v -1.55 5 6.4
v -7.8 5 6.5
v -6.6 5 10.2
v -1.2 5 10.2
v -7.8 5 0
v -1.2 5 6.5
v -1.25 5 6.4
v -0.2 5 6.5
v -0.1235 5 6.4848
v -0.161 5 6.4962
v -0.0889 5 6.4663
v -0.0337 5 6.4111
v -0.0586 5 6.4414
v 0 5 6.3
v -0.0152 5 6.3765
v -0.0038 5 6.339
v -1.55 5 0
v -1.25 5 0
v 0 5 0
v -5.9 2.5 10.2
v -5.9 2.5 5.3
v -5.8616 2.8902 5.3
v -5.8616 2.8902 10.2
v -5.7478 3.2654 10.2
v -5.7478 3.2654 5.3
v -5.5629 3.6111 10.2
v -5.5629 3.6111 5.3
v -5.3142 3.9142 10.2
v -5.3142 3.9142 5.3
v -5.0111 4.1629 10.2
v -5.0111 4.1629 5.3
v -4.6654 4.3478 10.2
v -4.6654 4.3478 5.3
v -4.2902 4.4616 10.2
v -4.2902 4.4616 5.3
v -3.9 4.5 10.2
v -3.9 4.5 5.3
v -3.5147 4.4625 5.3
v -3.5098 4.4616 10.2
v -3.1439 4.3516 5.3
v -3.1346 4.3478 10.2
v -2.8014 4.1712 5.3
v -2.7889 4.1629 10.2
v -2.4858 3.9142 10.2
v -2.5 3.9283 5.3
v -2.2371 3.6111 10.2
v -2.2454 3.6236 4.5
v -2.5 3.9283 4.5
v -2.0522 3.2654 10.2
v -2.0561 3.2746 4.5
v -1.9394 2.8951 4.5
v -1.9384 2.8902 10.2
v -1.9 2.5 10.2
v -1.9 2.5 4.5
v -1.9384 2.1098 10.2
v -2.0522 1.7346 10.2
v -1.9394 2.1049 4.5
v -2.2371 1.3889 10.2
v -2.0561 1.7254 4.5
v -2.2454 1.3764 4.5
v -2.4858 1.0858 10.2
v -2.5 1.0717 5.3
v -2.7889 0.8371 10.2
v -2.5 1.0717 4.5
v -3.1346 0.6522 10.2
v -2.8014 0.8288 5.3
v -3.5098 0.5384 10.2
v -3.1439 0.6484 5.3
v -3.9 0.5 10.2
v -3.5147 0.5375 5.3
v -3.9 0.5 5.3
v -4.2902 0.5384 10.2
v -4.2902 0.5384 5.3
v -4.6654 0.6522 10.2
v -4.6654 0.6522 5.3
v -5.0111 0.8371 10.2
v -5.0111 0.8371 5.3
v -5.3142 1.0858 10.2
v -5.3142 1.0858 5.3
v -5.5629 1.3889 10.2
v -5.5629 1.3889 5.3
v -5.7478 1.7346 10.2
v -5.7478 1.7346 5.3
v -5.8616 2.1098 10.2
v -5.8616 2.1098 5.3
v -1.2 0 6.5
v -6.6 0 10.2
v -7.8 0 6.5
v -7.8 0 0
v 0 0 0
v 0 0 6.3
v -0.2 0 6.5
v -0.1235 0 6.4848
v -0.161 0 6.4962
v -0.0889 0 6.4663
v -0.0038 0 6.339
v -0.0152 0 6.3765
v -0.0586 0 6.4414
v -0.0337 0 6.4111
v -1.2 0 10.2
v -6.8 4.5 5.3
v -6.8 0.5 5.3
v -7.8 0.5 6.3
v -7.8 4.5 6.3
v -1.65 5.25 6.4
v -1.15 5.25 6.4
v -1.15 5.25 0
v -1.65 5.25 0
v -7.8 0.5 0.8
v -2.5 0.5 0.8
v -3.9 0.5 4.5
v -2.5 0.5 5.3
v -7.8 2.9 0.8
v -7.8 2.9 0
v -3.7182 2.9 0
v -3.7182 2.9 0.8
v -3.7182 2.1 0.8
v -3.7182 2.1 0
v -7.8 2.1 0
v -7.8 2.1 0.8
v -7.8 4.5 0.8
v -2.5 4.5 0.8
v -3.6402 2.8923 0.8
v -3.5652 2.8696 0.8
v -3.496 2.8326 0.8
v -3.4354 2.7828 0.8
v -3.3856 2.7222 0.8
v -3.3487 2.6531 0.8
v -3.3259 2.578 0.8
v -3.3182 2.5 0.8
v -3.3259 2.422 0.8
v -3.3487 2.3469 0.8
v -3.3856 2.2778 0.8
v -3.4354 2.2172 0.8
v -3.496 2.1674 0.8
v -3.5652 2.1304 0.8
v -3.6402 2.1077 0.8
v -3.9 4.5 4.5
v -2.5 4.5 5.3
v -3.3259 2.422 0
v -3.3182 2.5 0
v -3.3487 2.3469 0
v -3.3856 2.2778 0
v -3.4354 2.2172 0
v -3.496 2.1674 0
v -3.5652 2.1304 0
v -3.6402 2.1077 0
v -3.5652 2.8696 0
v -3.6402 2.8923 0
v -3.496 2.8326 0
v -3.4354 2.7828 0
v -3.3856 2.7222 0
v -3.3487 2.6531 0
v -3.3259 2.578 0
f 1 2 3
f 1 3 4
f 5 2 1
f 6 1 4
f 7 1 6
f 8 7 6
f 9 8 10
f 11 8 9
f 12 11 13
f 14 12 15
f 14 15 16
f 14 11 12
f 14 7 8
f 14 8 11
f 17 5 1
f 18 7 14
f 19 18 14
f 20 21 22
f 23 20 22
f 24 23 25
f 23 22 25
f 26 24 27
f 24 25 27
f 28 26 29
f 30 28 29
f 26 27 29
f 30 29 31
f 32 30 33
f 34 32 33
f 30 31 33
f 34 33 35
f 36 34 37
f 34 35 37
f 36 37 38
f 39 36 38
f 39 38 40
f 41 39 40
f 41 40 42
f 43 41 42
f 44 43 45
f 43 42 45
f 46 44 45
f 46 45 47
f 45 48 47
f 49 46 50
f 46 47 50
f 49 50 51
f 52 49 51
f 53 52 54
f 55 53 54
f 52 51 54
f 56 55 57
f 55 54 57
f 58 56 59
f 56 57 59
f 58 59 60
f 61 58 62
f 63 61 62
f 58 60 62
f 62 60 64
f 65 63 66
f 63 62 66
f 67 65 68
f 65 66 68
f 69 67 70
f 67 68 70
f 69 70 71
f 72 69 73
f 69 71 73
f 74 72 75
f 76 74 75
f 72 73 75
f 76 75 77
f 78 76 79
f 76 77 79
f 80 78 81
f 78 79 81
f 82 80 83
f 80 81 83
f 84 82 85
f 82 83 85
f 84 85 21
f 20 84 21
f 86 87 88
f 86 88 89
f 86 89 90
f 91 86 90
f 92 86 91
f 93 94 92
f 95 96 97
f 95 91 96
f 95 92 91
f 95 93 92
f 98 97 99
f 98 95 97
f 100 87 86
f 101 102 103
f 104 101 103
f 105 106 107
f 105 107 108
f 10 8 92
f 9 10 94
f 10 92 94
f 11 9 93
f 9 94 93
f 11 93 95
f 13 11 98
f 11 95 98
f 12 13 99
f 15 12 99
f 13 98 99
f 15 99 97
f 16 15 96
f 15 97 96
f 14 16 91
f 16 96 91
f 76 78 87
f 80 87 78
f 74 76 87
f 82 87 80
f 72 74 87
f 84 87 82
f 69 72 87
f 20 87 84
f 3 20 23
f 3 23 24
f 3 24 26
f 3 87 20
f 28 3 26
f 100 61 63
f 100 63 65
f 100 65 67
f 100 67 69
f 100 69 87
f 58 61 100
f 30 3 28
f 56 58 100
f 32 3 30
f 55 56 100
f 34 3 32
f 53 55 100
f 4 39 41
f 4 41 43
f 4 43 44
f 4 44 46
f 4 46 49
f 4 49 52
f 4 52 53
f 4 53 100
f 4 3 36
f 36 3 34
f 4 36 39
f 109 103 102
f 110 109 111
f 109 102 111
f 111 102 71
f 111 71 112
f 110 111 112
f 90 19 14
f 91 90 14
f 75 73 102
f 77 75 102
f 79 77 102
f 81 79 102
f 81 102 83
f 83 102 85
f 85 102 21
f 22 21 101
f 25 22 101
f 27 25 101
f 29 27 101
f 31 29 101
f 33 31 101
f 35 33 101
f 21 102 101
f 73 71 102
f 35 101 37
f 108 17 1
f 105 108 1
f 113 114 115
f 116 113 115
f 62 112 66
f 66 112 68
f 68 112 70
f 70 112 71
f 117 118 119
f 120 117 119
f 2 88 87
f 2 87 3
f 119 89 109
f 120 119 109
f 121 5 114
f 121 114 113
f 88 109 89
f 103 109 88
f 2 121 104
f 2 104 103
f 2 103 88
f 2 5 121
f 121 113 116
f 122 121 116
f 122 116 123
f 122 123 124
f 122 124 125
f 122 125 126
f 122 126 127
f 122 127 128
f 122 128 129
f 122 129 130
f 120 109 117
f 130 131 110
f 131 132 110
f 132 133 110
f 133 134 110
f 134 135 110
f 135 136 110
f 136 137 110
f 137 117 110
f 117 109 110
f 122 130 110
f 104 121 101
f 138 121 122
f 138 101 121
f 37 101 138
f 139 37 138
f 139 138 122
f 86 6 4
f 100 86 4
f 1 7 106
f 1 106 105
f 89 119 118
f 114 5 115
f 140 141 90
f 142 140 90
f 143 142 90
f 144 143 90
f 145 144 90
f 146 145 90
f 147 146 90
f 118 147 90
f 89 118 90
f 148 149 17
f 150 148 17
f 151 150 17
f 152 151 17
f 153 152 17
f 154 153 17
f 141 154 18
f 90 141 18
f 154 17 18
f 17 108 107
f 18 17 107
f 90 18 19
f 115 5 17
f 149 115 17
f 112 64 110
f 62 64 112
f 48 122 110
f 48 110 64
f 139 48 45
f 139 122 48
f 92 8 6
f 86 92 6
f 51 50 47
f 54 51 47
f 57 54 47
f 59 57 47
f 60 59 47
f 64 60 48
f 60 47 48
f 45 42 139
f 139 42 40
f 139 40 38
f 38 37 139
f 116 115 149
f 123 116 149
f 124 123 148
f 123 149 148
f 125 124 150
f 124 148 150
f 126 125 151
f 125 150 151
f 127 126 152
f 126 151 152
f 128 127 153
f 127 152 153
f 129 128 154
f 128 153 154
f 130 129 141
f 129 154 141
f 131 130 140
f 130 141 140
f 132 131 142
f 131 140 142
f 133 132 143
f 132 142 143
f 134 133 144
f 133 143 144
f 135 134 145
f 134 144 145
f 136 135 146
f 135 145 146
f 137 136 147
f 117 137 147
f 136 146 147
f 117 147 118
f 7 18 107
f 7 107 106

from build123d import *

# Parameters (mm, degrees)
SKETCH_1_W                = 7.8
SKETCH_1_H                = 10.2
EXTRUDE_1_DEPTH           = 4.5
CUT_EXTRUDE_1_DEPTH       = 4
SKETCH_3_W                = 4.5
SKETCH_3_H                = 4
CUT_EXTRUDE_2_DEPTH       = 4.3
SKETCH_4_W                = 7.8
SKETCH_4_H                = 10.2
EXTRUDE_2_DEPTH           = 0.5
SKETCH_5_W                = 1.2
SKETCH_5_H                = 3.7
CUT_EXTRUDE_3_DEPTH       = 14.779695207
CUT_EXTRUDE_4_REACH       = 15.78
SKETCH_7_W                = 0.3
SKETCH_7_H                = 6.4
EXTRUDE_3_DEPTH           = 0.25
DRAFT_1_ANGLE             = -21.801409486
HOLE_WIZARD_4_0_4_1_D     = 4
HOLE_WIZARD_4_0_4_1_DEPTH = 5.7
CHAMFER_1_SIZE            = 1.2
CHAMFER_1_SIZE2           = 3.7
FILLET_1_R                = 0.2


with BuildPart() as part:
    # Эскиз1 → Бобышка-Вытянуть1 (new body)
    with BuildSketch(Plane(origin=(0, 5, 0), x_dir=(1, 0, 0), z_dir=(0, 1, 0))):
        with Locations((-3.9, -5.1)):
            Rectangle(SKETCH_1_W, SKETCH_1_H)
    extrude(amount=-EXTRUDE_1_DEPTH)

    # Эскиз2 → Вырез-Вытянуть1 (cut)
    with BuildSketch(Plane.XZ.offset(-0.5)):
        Polygon((-6.8, 0.8), (-6.8, 5.3), (-7.8, 6.3), (-7.8, 0.8), align=None)
    extrude(amount=-CUT_EXTRUDE_1_DEPTH, mode=Mode.SUBTRACT)

    # Эскиз3 → Вырез-Вытянуть2 (cut)
    with BuildSketch(Plane.ZY.offset(6.8)):
        with Locations((3.05, 2.5)):
            Rectangle(SKETCH_3_W, SKETCH_3_H)
    extrude(amount=-CUT_EXTRUDE_2_DEPTH, mode=Mode.SUBTRACT)

    # Эскиз4 → Бобышка-Вытянуть2 (add)
    with BuildSketch(Plane.XZ.offset(-0.5)):
        with Locations((-3.9, 5.1)):
            Rectangle(SKETCH_4_W, SKETCH_4_H)
    extrude(amount=EXTRUDE_2_DEPTH)

    # Эскиз5 → Вырез-Вытянуть3 (cut, through all)
    with BuildSketch(Plane(origin=(0, 5, 0), x_dir=(-1, 0, 0), z_dir=(0, 1, 0))):
        with Locations((0.6, 8.35)):
            Rectangle(SKETCH_5_W, SKETCH_5_H)
    extrude(amount=-CUT_EXTRUDE_3_DEPTH, mode=Mode.SUBTRACT)

    # Эскиз6 → Вырез-Вытянуть4 (cut, up to next)
    with BuildSketch(Plane(origin=(0, 0, 0), x_dir=(-1, 0, 0), z_dir=(0, 0, -1)), mode=Mode.PRIVATE) as cut_extrude_4_sk1:
        with BuildLine():
            Line((7.8, 2.1), (7.8, 2.9))
            Line((7.8, 2.9), (3.71823341, 2.9))
            ThreePointArc((3.71823341, 2.9), (3.31823341, 2.5), (3.71823341, 2.1))
            Line((3.71823341, 2.1), (7.8, 2.1))
        make_face()
    cut_extrude_4_tool1 = extrude(cut_extrude_4_sk1.sketch, amount=-CUT_EXTRUDE_4_REACH, mode=Mode.PRIVATE) & part.part
    add(cut_extrude_4_tool1.solids().sort_by_distance((-5.60113, 2.5, 0))[0], mode=Mode.SUBTRACT)

    # Эскиз7 → Бобышка-Вытянуть3 (add)
    with BuildSketch(Plane(origin=(0, 5, 0), x_dir=(-1, 0, 0), z_dir=(0, 1, 0))):
        with Locations((1.4, 3.2)):
            Rectangle(SKETCH_7_W, SKETCH_7_H)
    extrude(amount=EXTRUDE_3_DEPTH)

    # Уклон1
    draft_1_faces = [part.faces().sort_by_distance(p)[0] for p in [
        (-1.55, 5.125, 3.2),
        (-1.25, 5.125, 3.2),
    ]]
    draft(draft_1_faces, Plane.ZX.offset(5), DRAFT_1_ANGLE)

    # Диаметр отверстия Ø4.0 (4)1
    with Locations(Plane.XY.offset(10.2)):
        with Locations((-3.9, 2.5)):
            Hole(HOLE_WIZARD_4_0_4_1_D / 2, depth=HOLE_WIZARD_4_0_4_1_DEPTH)

    # Фаска1
    chamfer_1_edges = [part.edges().sort_by_distance(p)[0] for p in [
        (-7.8, 2.5, 10.2),
    ]]
    chamfer_1_side = [part.faces().sort_by_distance(p)[0] for p in [
        (-4.5, 4.917199034, 10.2),
    ]]
    chamfer(chamfer_1_edges, length=CHAMFER_1_SIZE, length2=CHAMFER_1_SIZE2, reference=chamfer_1_side[0])

    # Скругление1
    fillet_1_edges = [part.edges().sort_by_distance(p)[0] for p in [
        (0, 2.5, 6.5),
    ]]
    fillet(fillet_1_edges, radius=FILLET_1_R)


solid = part.part
